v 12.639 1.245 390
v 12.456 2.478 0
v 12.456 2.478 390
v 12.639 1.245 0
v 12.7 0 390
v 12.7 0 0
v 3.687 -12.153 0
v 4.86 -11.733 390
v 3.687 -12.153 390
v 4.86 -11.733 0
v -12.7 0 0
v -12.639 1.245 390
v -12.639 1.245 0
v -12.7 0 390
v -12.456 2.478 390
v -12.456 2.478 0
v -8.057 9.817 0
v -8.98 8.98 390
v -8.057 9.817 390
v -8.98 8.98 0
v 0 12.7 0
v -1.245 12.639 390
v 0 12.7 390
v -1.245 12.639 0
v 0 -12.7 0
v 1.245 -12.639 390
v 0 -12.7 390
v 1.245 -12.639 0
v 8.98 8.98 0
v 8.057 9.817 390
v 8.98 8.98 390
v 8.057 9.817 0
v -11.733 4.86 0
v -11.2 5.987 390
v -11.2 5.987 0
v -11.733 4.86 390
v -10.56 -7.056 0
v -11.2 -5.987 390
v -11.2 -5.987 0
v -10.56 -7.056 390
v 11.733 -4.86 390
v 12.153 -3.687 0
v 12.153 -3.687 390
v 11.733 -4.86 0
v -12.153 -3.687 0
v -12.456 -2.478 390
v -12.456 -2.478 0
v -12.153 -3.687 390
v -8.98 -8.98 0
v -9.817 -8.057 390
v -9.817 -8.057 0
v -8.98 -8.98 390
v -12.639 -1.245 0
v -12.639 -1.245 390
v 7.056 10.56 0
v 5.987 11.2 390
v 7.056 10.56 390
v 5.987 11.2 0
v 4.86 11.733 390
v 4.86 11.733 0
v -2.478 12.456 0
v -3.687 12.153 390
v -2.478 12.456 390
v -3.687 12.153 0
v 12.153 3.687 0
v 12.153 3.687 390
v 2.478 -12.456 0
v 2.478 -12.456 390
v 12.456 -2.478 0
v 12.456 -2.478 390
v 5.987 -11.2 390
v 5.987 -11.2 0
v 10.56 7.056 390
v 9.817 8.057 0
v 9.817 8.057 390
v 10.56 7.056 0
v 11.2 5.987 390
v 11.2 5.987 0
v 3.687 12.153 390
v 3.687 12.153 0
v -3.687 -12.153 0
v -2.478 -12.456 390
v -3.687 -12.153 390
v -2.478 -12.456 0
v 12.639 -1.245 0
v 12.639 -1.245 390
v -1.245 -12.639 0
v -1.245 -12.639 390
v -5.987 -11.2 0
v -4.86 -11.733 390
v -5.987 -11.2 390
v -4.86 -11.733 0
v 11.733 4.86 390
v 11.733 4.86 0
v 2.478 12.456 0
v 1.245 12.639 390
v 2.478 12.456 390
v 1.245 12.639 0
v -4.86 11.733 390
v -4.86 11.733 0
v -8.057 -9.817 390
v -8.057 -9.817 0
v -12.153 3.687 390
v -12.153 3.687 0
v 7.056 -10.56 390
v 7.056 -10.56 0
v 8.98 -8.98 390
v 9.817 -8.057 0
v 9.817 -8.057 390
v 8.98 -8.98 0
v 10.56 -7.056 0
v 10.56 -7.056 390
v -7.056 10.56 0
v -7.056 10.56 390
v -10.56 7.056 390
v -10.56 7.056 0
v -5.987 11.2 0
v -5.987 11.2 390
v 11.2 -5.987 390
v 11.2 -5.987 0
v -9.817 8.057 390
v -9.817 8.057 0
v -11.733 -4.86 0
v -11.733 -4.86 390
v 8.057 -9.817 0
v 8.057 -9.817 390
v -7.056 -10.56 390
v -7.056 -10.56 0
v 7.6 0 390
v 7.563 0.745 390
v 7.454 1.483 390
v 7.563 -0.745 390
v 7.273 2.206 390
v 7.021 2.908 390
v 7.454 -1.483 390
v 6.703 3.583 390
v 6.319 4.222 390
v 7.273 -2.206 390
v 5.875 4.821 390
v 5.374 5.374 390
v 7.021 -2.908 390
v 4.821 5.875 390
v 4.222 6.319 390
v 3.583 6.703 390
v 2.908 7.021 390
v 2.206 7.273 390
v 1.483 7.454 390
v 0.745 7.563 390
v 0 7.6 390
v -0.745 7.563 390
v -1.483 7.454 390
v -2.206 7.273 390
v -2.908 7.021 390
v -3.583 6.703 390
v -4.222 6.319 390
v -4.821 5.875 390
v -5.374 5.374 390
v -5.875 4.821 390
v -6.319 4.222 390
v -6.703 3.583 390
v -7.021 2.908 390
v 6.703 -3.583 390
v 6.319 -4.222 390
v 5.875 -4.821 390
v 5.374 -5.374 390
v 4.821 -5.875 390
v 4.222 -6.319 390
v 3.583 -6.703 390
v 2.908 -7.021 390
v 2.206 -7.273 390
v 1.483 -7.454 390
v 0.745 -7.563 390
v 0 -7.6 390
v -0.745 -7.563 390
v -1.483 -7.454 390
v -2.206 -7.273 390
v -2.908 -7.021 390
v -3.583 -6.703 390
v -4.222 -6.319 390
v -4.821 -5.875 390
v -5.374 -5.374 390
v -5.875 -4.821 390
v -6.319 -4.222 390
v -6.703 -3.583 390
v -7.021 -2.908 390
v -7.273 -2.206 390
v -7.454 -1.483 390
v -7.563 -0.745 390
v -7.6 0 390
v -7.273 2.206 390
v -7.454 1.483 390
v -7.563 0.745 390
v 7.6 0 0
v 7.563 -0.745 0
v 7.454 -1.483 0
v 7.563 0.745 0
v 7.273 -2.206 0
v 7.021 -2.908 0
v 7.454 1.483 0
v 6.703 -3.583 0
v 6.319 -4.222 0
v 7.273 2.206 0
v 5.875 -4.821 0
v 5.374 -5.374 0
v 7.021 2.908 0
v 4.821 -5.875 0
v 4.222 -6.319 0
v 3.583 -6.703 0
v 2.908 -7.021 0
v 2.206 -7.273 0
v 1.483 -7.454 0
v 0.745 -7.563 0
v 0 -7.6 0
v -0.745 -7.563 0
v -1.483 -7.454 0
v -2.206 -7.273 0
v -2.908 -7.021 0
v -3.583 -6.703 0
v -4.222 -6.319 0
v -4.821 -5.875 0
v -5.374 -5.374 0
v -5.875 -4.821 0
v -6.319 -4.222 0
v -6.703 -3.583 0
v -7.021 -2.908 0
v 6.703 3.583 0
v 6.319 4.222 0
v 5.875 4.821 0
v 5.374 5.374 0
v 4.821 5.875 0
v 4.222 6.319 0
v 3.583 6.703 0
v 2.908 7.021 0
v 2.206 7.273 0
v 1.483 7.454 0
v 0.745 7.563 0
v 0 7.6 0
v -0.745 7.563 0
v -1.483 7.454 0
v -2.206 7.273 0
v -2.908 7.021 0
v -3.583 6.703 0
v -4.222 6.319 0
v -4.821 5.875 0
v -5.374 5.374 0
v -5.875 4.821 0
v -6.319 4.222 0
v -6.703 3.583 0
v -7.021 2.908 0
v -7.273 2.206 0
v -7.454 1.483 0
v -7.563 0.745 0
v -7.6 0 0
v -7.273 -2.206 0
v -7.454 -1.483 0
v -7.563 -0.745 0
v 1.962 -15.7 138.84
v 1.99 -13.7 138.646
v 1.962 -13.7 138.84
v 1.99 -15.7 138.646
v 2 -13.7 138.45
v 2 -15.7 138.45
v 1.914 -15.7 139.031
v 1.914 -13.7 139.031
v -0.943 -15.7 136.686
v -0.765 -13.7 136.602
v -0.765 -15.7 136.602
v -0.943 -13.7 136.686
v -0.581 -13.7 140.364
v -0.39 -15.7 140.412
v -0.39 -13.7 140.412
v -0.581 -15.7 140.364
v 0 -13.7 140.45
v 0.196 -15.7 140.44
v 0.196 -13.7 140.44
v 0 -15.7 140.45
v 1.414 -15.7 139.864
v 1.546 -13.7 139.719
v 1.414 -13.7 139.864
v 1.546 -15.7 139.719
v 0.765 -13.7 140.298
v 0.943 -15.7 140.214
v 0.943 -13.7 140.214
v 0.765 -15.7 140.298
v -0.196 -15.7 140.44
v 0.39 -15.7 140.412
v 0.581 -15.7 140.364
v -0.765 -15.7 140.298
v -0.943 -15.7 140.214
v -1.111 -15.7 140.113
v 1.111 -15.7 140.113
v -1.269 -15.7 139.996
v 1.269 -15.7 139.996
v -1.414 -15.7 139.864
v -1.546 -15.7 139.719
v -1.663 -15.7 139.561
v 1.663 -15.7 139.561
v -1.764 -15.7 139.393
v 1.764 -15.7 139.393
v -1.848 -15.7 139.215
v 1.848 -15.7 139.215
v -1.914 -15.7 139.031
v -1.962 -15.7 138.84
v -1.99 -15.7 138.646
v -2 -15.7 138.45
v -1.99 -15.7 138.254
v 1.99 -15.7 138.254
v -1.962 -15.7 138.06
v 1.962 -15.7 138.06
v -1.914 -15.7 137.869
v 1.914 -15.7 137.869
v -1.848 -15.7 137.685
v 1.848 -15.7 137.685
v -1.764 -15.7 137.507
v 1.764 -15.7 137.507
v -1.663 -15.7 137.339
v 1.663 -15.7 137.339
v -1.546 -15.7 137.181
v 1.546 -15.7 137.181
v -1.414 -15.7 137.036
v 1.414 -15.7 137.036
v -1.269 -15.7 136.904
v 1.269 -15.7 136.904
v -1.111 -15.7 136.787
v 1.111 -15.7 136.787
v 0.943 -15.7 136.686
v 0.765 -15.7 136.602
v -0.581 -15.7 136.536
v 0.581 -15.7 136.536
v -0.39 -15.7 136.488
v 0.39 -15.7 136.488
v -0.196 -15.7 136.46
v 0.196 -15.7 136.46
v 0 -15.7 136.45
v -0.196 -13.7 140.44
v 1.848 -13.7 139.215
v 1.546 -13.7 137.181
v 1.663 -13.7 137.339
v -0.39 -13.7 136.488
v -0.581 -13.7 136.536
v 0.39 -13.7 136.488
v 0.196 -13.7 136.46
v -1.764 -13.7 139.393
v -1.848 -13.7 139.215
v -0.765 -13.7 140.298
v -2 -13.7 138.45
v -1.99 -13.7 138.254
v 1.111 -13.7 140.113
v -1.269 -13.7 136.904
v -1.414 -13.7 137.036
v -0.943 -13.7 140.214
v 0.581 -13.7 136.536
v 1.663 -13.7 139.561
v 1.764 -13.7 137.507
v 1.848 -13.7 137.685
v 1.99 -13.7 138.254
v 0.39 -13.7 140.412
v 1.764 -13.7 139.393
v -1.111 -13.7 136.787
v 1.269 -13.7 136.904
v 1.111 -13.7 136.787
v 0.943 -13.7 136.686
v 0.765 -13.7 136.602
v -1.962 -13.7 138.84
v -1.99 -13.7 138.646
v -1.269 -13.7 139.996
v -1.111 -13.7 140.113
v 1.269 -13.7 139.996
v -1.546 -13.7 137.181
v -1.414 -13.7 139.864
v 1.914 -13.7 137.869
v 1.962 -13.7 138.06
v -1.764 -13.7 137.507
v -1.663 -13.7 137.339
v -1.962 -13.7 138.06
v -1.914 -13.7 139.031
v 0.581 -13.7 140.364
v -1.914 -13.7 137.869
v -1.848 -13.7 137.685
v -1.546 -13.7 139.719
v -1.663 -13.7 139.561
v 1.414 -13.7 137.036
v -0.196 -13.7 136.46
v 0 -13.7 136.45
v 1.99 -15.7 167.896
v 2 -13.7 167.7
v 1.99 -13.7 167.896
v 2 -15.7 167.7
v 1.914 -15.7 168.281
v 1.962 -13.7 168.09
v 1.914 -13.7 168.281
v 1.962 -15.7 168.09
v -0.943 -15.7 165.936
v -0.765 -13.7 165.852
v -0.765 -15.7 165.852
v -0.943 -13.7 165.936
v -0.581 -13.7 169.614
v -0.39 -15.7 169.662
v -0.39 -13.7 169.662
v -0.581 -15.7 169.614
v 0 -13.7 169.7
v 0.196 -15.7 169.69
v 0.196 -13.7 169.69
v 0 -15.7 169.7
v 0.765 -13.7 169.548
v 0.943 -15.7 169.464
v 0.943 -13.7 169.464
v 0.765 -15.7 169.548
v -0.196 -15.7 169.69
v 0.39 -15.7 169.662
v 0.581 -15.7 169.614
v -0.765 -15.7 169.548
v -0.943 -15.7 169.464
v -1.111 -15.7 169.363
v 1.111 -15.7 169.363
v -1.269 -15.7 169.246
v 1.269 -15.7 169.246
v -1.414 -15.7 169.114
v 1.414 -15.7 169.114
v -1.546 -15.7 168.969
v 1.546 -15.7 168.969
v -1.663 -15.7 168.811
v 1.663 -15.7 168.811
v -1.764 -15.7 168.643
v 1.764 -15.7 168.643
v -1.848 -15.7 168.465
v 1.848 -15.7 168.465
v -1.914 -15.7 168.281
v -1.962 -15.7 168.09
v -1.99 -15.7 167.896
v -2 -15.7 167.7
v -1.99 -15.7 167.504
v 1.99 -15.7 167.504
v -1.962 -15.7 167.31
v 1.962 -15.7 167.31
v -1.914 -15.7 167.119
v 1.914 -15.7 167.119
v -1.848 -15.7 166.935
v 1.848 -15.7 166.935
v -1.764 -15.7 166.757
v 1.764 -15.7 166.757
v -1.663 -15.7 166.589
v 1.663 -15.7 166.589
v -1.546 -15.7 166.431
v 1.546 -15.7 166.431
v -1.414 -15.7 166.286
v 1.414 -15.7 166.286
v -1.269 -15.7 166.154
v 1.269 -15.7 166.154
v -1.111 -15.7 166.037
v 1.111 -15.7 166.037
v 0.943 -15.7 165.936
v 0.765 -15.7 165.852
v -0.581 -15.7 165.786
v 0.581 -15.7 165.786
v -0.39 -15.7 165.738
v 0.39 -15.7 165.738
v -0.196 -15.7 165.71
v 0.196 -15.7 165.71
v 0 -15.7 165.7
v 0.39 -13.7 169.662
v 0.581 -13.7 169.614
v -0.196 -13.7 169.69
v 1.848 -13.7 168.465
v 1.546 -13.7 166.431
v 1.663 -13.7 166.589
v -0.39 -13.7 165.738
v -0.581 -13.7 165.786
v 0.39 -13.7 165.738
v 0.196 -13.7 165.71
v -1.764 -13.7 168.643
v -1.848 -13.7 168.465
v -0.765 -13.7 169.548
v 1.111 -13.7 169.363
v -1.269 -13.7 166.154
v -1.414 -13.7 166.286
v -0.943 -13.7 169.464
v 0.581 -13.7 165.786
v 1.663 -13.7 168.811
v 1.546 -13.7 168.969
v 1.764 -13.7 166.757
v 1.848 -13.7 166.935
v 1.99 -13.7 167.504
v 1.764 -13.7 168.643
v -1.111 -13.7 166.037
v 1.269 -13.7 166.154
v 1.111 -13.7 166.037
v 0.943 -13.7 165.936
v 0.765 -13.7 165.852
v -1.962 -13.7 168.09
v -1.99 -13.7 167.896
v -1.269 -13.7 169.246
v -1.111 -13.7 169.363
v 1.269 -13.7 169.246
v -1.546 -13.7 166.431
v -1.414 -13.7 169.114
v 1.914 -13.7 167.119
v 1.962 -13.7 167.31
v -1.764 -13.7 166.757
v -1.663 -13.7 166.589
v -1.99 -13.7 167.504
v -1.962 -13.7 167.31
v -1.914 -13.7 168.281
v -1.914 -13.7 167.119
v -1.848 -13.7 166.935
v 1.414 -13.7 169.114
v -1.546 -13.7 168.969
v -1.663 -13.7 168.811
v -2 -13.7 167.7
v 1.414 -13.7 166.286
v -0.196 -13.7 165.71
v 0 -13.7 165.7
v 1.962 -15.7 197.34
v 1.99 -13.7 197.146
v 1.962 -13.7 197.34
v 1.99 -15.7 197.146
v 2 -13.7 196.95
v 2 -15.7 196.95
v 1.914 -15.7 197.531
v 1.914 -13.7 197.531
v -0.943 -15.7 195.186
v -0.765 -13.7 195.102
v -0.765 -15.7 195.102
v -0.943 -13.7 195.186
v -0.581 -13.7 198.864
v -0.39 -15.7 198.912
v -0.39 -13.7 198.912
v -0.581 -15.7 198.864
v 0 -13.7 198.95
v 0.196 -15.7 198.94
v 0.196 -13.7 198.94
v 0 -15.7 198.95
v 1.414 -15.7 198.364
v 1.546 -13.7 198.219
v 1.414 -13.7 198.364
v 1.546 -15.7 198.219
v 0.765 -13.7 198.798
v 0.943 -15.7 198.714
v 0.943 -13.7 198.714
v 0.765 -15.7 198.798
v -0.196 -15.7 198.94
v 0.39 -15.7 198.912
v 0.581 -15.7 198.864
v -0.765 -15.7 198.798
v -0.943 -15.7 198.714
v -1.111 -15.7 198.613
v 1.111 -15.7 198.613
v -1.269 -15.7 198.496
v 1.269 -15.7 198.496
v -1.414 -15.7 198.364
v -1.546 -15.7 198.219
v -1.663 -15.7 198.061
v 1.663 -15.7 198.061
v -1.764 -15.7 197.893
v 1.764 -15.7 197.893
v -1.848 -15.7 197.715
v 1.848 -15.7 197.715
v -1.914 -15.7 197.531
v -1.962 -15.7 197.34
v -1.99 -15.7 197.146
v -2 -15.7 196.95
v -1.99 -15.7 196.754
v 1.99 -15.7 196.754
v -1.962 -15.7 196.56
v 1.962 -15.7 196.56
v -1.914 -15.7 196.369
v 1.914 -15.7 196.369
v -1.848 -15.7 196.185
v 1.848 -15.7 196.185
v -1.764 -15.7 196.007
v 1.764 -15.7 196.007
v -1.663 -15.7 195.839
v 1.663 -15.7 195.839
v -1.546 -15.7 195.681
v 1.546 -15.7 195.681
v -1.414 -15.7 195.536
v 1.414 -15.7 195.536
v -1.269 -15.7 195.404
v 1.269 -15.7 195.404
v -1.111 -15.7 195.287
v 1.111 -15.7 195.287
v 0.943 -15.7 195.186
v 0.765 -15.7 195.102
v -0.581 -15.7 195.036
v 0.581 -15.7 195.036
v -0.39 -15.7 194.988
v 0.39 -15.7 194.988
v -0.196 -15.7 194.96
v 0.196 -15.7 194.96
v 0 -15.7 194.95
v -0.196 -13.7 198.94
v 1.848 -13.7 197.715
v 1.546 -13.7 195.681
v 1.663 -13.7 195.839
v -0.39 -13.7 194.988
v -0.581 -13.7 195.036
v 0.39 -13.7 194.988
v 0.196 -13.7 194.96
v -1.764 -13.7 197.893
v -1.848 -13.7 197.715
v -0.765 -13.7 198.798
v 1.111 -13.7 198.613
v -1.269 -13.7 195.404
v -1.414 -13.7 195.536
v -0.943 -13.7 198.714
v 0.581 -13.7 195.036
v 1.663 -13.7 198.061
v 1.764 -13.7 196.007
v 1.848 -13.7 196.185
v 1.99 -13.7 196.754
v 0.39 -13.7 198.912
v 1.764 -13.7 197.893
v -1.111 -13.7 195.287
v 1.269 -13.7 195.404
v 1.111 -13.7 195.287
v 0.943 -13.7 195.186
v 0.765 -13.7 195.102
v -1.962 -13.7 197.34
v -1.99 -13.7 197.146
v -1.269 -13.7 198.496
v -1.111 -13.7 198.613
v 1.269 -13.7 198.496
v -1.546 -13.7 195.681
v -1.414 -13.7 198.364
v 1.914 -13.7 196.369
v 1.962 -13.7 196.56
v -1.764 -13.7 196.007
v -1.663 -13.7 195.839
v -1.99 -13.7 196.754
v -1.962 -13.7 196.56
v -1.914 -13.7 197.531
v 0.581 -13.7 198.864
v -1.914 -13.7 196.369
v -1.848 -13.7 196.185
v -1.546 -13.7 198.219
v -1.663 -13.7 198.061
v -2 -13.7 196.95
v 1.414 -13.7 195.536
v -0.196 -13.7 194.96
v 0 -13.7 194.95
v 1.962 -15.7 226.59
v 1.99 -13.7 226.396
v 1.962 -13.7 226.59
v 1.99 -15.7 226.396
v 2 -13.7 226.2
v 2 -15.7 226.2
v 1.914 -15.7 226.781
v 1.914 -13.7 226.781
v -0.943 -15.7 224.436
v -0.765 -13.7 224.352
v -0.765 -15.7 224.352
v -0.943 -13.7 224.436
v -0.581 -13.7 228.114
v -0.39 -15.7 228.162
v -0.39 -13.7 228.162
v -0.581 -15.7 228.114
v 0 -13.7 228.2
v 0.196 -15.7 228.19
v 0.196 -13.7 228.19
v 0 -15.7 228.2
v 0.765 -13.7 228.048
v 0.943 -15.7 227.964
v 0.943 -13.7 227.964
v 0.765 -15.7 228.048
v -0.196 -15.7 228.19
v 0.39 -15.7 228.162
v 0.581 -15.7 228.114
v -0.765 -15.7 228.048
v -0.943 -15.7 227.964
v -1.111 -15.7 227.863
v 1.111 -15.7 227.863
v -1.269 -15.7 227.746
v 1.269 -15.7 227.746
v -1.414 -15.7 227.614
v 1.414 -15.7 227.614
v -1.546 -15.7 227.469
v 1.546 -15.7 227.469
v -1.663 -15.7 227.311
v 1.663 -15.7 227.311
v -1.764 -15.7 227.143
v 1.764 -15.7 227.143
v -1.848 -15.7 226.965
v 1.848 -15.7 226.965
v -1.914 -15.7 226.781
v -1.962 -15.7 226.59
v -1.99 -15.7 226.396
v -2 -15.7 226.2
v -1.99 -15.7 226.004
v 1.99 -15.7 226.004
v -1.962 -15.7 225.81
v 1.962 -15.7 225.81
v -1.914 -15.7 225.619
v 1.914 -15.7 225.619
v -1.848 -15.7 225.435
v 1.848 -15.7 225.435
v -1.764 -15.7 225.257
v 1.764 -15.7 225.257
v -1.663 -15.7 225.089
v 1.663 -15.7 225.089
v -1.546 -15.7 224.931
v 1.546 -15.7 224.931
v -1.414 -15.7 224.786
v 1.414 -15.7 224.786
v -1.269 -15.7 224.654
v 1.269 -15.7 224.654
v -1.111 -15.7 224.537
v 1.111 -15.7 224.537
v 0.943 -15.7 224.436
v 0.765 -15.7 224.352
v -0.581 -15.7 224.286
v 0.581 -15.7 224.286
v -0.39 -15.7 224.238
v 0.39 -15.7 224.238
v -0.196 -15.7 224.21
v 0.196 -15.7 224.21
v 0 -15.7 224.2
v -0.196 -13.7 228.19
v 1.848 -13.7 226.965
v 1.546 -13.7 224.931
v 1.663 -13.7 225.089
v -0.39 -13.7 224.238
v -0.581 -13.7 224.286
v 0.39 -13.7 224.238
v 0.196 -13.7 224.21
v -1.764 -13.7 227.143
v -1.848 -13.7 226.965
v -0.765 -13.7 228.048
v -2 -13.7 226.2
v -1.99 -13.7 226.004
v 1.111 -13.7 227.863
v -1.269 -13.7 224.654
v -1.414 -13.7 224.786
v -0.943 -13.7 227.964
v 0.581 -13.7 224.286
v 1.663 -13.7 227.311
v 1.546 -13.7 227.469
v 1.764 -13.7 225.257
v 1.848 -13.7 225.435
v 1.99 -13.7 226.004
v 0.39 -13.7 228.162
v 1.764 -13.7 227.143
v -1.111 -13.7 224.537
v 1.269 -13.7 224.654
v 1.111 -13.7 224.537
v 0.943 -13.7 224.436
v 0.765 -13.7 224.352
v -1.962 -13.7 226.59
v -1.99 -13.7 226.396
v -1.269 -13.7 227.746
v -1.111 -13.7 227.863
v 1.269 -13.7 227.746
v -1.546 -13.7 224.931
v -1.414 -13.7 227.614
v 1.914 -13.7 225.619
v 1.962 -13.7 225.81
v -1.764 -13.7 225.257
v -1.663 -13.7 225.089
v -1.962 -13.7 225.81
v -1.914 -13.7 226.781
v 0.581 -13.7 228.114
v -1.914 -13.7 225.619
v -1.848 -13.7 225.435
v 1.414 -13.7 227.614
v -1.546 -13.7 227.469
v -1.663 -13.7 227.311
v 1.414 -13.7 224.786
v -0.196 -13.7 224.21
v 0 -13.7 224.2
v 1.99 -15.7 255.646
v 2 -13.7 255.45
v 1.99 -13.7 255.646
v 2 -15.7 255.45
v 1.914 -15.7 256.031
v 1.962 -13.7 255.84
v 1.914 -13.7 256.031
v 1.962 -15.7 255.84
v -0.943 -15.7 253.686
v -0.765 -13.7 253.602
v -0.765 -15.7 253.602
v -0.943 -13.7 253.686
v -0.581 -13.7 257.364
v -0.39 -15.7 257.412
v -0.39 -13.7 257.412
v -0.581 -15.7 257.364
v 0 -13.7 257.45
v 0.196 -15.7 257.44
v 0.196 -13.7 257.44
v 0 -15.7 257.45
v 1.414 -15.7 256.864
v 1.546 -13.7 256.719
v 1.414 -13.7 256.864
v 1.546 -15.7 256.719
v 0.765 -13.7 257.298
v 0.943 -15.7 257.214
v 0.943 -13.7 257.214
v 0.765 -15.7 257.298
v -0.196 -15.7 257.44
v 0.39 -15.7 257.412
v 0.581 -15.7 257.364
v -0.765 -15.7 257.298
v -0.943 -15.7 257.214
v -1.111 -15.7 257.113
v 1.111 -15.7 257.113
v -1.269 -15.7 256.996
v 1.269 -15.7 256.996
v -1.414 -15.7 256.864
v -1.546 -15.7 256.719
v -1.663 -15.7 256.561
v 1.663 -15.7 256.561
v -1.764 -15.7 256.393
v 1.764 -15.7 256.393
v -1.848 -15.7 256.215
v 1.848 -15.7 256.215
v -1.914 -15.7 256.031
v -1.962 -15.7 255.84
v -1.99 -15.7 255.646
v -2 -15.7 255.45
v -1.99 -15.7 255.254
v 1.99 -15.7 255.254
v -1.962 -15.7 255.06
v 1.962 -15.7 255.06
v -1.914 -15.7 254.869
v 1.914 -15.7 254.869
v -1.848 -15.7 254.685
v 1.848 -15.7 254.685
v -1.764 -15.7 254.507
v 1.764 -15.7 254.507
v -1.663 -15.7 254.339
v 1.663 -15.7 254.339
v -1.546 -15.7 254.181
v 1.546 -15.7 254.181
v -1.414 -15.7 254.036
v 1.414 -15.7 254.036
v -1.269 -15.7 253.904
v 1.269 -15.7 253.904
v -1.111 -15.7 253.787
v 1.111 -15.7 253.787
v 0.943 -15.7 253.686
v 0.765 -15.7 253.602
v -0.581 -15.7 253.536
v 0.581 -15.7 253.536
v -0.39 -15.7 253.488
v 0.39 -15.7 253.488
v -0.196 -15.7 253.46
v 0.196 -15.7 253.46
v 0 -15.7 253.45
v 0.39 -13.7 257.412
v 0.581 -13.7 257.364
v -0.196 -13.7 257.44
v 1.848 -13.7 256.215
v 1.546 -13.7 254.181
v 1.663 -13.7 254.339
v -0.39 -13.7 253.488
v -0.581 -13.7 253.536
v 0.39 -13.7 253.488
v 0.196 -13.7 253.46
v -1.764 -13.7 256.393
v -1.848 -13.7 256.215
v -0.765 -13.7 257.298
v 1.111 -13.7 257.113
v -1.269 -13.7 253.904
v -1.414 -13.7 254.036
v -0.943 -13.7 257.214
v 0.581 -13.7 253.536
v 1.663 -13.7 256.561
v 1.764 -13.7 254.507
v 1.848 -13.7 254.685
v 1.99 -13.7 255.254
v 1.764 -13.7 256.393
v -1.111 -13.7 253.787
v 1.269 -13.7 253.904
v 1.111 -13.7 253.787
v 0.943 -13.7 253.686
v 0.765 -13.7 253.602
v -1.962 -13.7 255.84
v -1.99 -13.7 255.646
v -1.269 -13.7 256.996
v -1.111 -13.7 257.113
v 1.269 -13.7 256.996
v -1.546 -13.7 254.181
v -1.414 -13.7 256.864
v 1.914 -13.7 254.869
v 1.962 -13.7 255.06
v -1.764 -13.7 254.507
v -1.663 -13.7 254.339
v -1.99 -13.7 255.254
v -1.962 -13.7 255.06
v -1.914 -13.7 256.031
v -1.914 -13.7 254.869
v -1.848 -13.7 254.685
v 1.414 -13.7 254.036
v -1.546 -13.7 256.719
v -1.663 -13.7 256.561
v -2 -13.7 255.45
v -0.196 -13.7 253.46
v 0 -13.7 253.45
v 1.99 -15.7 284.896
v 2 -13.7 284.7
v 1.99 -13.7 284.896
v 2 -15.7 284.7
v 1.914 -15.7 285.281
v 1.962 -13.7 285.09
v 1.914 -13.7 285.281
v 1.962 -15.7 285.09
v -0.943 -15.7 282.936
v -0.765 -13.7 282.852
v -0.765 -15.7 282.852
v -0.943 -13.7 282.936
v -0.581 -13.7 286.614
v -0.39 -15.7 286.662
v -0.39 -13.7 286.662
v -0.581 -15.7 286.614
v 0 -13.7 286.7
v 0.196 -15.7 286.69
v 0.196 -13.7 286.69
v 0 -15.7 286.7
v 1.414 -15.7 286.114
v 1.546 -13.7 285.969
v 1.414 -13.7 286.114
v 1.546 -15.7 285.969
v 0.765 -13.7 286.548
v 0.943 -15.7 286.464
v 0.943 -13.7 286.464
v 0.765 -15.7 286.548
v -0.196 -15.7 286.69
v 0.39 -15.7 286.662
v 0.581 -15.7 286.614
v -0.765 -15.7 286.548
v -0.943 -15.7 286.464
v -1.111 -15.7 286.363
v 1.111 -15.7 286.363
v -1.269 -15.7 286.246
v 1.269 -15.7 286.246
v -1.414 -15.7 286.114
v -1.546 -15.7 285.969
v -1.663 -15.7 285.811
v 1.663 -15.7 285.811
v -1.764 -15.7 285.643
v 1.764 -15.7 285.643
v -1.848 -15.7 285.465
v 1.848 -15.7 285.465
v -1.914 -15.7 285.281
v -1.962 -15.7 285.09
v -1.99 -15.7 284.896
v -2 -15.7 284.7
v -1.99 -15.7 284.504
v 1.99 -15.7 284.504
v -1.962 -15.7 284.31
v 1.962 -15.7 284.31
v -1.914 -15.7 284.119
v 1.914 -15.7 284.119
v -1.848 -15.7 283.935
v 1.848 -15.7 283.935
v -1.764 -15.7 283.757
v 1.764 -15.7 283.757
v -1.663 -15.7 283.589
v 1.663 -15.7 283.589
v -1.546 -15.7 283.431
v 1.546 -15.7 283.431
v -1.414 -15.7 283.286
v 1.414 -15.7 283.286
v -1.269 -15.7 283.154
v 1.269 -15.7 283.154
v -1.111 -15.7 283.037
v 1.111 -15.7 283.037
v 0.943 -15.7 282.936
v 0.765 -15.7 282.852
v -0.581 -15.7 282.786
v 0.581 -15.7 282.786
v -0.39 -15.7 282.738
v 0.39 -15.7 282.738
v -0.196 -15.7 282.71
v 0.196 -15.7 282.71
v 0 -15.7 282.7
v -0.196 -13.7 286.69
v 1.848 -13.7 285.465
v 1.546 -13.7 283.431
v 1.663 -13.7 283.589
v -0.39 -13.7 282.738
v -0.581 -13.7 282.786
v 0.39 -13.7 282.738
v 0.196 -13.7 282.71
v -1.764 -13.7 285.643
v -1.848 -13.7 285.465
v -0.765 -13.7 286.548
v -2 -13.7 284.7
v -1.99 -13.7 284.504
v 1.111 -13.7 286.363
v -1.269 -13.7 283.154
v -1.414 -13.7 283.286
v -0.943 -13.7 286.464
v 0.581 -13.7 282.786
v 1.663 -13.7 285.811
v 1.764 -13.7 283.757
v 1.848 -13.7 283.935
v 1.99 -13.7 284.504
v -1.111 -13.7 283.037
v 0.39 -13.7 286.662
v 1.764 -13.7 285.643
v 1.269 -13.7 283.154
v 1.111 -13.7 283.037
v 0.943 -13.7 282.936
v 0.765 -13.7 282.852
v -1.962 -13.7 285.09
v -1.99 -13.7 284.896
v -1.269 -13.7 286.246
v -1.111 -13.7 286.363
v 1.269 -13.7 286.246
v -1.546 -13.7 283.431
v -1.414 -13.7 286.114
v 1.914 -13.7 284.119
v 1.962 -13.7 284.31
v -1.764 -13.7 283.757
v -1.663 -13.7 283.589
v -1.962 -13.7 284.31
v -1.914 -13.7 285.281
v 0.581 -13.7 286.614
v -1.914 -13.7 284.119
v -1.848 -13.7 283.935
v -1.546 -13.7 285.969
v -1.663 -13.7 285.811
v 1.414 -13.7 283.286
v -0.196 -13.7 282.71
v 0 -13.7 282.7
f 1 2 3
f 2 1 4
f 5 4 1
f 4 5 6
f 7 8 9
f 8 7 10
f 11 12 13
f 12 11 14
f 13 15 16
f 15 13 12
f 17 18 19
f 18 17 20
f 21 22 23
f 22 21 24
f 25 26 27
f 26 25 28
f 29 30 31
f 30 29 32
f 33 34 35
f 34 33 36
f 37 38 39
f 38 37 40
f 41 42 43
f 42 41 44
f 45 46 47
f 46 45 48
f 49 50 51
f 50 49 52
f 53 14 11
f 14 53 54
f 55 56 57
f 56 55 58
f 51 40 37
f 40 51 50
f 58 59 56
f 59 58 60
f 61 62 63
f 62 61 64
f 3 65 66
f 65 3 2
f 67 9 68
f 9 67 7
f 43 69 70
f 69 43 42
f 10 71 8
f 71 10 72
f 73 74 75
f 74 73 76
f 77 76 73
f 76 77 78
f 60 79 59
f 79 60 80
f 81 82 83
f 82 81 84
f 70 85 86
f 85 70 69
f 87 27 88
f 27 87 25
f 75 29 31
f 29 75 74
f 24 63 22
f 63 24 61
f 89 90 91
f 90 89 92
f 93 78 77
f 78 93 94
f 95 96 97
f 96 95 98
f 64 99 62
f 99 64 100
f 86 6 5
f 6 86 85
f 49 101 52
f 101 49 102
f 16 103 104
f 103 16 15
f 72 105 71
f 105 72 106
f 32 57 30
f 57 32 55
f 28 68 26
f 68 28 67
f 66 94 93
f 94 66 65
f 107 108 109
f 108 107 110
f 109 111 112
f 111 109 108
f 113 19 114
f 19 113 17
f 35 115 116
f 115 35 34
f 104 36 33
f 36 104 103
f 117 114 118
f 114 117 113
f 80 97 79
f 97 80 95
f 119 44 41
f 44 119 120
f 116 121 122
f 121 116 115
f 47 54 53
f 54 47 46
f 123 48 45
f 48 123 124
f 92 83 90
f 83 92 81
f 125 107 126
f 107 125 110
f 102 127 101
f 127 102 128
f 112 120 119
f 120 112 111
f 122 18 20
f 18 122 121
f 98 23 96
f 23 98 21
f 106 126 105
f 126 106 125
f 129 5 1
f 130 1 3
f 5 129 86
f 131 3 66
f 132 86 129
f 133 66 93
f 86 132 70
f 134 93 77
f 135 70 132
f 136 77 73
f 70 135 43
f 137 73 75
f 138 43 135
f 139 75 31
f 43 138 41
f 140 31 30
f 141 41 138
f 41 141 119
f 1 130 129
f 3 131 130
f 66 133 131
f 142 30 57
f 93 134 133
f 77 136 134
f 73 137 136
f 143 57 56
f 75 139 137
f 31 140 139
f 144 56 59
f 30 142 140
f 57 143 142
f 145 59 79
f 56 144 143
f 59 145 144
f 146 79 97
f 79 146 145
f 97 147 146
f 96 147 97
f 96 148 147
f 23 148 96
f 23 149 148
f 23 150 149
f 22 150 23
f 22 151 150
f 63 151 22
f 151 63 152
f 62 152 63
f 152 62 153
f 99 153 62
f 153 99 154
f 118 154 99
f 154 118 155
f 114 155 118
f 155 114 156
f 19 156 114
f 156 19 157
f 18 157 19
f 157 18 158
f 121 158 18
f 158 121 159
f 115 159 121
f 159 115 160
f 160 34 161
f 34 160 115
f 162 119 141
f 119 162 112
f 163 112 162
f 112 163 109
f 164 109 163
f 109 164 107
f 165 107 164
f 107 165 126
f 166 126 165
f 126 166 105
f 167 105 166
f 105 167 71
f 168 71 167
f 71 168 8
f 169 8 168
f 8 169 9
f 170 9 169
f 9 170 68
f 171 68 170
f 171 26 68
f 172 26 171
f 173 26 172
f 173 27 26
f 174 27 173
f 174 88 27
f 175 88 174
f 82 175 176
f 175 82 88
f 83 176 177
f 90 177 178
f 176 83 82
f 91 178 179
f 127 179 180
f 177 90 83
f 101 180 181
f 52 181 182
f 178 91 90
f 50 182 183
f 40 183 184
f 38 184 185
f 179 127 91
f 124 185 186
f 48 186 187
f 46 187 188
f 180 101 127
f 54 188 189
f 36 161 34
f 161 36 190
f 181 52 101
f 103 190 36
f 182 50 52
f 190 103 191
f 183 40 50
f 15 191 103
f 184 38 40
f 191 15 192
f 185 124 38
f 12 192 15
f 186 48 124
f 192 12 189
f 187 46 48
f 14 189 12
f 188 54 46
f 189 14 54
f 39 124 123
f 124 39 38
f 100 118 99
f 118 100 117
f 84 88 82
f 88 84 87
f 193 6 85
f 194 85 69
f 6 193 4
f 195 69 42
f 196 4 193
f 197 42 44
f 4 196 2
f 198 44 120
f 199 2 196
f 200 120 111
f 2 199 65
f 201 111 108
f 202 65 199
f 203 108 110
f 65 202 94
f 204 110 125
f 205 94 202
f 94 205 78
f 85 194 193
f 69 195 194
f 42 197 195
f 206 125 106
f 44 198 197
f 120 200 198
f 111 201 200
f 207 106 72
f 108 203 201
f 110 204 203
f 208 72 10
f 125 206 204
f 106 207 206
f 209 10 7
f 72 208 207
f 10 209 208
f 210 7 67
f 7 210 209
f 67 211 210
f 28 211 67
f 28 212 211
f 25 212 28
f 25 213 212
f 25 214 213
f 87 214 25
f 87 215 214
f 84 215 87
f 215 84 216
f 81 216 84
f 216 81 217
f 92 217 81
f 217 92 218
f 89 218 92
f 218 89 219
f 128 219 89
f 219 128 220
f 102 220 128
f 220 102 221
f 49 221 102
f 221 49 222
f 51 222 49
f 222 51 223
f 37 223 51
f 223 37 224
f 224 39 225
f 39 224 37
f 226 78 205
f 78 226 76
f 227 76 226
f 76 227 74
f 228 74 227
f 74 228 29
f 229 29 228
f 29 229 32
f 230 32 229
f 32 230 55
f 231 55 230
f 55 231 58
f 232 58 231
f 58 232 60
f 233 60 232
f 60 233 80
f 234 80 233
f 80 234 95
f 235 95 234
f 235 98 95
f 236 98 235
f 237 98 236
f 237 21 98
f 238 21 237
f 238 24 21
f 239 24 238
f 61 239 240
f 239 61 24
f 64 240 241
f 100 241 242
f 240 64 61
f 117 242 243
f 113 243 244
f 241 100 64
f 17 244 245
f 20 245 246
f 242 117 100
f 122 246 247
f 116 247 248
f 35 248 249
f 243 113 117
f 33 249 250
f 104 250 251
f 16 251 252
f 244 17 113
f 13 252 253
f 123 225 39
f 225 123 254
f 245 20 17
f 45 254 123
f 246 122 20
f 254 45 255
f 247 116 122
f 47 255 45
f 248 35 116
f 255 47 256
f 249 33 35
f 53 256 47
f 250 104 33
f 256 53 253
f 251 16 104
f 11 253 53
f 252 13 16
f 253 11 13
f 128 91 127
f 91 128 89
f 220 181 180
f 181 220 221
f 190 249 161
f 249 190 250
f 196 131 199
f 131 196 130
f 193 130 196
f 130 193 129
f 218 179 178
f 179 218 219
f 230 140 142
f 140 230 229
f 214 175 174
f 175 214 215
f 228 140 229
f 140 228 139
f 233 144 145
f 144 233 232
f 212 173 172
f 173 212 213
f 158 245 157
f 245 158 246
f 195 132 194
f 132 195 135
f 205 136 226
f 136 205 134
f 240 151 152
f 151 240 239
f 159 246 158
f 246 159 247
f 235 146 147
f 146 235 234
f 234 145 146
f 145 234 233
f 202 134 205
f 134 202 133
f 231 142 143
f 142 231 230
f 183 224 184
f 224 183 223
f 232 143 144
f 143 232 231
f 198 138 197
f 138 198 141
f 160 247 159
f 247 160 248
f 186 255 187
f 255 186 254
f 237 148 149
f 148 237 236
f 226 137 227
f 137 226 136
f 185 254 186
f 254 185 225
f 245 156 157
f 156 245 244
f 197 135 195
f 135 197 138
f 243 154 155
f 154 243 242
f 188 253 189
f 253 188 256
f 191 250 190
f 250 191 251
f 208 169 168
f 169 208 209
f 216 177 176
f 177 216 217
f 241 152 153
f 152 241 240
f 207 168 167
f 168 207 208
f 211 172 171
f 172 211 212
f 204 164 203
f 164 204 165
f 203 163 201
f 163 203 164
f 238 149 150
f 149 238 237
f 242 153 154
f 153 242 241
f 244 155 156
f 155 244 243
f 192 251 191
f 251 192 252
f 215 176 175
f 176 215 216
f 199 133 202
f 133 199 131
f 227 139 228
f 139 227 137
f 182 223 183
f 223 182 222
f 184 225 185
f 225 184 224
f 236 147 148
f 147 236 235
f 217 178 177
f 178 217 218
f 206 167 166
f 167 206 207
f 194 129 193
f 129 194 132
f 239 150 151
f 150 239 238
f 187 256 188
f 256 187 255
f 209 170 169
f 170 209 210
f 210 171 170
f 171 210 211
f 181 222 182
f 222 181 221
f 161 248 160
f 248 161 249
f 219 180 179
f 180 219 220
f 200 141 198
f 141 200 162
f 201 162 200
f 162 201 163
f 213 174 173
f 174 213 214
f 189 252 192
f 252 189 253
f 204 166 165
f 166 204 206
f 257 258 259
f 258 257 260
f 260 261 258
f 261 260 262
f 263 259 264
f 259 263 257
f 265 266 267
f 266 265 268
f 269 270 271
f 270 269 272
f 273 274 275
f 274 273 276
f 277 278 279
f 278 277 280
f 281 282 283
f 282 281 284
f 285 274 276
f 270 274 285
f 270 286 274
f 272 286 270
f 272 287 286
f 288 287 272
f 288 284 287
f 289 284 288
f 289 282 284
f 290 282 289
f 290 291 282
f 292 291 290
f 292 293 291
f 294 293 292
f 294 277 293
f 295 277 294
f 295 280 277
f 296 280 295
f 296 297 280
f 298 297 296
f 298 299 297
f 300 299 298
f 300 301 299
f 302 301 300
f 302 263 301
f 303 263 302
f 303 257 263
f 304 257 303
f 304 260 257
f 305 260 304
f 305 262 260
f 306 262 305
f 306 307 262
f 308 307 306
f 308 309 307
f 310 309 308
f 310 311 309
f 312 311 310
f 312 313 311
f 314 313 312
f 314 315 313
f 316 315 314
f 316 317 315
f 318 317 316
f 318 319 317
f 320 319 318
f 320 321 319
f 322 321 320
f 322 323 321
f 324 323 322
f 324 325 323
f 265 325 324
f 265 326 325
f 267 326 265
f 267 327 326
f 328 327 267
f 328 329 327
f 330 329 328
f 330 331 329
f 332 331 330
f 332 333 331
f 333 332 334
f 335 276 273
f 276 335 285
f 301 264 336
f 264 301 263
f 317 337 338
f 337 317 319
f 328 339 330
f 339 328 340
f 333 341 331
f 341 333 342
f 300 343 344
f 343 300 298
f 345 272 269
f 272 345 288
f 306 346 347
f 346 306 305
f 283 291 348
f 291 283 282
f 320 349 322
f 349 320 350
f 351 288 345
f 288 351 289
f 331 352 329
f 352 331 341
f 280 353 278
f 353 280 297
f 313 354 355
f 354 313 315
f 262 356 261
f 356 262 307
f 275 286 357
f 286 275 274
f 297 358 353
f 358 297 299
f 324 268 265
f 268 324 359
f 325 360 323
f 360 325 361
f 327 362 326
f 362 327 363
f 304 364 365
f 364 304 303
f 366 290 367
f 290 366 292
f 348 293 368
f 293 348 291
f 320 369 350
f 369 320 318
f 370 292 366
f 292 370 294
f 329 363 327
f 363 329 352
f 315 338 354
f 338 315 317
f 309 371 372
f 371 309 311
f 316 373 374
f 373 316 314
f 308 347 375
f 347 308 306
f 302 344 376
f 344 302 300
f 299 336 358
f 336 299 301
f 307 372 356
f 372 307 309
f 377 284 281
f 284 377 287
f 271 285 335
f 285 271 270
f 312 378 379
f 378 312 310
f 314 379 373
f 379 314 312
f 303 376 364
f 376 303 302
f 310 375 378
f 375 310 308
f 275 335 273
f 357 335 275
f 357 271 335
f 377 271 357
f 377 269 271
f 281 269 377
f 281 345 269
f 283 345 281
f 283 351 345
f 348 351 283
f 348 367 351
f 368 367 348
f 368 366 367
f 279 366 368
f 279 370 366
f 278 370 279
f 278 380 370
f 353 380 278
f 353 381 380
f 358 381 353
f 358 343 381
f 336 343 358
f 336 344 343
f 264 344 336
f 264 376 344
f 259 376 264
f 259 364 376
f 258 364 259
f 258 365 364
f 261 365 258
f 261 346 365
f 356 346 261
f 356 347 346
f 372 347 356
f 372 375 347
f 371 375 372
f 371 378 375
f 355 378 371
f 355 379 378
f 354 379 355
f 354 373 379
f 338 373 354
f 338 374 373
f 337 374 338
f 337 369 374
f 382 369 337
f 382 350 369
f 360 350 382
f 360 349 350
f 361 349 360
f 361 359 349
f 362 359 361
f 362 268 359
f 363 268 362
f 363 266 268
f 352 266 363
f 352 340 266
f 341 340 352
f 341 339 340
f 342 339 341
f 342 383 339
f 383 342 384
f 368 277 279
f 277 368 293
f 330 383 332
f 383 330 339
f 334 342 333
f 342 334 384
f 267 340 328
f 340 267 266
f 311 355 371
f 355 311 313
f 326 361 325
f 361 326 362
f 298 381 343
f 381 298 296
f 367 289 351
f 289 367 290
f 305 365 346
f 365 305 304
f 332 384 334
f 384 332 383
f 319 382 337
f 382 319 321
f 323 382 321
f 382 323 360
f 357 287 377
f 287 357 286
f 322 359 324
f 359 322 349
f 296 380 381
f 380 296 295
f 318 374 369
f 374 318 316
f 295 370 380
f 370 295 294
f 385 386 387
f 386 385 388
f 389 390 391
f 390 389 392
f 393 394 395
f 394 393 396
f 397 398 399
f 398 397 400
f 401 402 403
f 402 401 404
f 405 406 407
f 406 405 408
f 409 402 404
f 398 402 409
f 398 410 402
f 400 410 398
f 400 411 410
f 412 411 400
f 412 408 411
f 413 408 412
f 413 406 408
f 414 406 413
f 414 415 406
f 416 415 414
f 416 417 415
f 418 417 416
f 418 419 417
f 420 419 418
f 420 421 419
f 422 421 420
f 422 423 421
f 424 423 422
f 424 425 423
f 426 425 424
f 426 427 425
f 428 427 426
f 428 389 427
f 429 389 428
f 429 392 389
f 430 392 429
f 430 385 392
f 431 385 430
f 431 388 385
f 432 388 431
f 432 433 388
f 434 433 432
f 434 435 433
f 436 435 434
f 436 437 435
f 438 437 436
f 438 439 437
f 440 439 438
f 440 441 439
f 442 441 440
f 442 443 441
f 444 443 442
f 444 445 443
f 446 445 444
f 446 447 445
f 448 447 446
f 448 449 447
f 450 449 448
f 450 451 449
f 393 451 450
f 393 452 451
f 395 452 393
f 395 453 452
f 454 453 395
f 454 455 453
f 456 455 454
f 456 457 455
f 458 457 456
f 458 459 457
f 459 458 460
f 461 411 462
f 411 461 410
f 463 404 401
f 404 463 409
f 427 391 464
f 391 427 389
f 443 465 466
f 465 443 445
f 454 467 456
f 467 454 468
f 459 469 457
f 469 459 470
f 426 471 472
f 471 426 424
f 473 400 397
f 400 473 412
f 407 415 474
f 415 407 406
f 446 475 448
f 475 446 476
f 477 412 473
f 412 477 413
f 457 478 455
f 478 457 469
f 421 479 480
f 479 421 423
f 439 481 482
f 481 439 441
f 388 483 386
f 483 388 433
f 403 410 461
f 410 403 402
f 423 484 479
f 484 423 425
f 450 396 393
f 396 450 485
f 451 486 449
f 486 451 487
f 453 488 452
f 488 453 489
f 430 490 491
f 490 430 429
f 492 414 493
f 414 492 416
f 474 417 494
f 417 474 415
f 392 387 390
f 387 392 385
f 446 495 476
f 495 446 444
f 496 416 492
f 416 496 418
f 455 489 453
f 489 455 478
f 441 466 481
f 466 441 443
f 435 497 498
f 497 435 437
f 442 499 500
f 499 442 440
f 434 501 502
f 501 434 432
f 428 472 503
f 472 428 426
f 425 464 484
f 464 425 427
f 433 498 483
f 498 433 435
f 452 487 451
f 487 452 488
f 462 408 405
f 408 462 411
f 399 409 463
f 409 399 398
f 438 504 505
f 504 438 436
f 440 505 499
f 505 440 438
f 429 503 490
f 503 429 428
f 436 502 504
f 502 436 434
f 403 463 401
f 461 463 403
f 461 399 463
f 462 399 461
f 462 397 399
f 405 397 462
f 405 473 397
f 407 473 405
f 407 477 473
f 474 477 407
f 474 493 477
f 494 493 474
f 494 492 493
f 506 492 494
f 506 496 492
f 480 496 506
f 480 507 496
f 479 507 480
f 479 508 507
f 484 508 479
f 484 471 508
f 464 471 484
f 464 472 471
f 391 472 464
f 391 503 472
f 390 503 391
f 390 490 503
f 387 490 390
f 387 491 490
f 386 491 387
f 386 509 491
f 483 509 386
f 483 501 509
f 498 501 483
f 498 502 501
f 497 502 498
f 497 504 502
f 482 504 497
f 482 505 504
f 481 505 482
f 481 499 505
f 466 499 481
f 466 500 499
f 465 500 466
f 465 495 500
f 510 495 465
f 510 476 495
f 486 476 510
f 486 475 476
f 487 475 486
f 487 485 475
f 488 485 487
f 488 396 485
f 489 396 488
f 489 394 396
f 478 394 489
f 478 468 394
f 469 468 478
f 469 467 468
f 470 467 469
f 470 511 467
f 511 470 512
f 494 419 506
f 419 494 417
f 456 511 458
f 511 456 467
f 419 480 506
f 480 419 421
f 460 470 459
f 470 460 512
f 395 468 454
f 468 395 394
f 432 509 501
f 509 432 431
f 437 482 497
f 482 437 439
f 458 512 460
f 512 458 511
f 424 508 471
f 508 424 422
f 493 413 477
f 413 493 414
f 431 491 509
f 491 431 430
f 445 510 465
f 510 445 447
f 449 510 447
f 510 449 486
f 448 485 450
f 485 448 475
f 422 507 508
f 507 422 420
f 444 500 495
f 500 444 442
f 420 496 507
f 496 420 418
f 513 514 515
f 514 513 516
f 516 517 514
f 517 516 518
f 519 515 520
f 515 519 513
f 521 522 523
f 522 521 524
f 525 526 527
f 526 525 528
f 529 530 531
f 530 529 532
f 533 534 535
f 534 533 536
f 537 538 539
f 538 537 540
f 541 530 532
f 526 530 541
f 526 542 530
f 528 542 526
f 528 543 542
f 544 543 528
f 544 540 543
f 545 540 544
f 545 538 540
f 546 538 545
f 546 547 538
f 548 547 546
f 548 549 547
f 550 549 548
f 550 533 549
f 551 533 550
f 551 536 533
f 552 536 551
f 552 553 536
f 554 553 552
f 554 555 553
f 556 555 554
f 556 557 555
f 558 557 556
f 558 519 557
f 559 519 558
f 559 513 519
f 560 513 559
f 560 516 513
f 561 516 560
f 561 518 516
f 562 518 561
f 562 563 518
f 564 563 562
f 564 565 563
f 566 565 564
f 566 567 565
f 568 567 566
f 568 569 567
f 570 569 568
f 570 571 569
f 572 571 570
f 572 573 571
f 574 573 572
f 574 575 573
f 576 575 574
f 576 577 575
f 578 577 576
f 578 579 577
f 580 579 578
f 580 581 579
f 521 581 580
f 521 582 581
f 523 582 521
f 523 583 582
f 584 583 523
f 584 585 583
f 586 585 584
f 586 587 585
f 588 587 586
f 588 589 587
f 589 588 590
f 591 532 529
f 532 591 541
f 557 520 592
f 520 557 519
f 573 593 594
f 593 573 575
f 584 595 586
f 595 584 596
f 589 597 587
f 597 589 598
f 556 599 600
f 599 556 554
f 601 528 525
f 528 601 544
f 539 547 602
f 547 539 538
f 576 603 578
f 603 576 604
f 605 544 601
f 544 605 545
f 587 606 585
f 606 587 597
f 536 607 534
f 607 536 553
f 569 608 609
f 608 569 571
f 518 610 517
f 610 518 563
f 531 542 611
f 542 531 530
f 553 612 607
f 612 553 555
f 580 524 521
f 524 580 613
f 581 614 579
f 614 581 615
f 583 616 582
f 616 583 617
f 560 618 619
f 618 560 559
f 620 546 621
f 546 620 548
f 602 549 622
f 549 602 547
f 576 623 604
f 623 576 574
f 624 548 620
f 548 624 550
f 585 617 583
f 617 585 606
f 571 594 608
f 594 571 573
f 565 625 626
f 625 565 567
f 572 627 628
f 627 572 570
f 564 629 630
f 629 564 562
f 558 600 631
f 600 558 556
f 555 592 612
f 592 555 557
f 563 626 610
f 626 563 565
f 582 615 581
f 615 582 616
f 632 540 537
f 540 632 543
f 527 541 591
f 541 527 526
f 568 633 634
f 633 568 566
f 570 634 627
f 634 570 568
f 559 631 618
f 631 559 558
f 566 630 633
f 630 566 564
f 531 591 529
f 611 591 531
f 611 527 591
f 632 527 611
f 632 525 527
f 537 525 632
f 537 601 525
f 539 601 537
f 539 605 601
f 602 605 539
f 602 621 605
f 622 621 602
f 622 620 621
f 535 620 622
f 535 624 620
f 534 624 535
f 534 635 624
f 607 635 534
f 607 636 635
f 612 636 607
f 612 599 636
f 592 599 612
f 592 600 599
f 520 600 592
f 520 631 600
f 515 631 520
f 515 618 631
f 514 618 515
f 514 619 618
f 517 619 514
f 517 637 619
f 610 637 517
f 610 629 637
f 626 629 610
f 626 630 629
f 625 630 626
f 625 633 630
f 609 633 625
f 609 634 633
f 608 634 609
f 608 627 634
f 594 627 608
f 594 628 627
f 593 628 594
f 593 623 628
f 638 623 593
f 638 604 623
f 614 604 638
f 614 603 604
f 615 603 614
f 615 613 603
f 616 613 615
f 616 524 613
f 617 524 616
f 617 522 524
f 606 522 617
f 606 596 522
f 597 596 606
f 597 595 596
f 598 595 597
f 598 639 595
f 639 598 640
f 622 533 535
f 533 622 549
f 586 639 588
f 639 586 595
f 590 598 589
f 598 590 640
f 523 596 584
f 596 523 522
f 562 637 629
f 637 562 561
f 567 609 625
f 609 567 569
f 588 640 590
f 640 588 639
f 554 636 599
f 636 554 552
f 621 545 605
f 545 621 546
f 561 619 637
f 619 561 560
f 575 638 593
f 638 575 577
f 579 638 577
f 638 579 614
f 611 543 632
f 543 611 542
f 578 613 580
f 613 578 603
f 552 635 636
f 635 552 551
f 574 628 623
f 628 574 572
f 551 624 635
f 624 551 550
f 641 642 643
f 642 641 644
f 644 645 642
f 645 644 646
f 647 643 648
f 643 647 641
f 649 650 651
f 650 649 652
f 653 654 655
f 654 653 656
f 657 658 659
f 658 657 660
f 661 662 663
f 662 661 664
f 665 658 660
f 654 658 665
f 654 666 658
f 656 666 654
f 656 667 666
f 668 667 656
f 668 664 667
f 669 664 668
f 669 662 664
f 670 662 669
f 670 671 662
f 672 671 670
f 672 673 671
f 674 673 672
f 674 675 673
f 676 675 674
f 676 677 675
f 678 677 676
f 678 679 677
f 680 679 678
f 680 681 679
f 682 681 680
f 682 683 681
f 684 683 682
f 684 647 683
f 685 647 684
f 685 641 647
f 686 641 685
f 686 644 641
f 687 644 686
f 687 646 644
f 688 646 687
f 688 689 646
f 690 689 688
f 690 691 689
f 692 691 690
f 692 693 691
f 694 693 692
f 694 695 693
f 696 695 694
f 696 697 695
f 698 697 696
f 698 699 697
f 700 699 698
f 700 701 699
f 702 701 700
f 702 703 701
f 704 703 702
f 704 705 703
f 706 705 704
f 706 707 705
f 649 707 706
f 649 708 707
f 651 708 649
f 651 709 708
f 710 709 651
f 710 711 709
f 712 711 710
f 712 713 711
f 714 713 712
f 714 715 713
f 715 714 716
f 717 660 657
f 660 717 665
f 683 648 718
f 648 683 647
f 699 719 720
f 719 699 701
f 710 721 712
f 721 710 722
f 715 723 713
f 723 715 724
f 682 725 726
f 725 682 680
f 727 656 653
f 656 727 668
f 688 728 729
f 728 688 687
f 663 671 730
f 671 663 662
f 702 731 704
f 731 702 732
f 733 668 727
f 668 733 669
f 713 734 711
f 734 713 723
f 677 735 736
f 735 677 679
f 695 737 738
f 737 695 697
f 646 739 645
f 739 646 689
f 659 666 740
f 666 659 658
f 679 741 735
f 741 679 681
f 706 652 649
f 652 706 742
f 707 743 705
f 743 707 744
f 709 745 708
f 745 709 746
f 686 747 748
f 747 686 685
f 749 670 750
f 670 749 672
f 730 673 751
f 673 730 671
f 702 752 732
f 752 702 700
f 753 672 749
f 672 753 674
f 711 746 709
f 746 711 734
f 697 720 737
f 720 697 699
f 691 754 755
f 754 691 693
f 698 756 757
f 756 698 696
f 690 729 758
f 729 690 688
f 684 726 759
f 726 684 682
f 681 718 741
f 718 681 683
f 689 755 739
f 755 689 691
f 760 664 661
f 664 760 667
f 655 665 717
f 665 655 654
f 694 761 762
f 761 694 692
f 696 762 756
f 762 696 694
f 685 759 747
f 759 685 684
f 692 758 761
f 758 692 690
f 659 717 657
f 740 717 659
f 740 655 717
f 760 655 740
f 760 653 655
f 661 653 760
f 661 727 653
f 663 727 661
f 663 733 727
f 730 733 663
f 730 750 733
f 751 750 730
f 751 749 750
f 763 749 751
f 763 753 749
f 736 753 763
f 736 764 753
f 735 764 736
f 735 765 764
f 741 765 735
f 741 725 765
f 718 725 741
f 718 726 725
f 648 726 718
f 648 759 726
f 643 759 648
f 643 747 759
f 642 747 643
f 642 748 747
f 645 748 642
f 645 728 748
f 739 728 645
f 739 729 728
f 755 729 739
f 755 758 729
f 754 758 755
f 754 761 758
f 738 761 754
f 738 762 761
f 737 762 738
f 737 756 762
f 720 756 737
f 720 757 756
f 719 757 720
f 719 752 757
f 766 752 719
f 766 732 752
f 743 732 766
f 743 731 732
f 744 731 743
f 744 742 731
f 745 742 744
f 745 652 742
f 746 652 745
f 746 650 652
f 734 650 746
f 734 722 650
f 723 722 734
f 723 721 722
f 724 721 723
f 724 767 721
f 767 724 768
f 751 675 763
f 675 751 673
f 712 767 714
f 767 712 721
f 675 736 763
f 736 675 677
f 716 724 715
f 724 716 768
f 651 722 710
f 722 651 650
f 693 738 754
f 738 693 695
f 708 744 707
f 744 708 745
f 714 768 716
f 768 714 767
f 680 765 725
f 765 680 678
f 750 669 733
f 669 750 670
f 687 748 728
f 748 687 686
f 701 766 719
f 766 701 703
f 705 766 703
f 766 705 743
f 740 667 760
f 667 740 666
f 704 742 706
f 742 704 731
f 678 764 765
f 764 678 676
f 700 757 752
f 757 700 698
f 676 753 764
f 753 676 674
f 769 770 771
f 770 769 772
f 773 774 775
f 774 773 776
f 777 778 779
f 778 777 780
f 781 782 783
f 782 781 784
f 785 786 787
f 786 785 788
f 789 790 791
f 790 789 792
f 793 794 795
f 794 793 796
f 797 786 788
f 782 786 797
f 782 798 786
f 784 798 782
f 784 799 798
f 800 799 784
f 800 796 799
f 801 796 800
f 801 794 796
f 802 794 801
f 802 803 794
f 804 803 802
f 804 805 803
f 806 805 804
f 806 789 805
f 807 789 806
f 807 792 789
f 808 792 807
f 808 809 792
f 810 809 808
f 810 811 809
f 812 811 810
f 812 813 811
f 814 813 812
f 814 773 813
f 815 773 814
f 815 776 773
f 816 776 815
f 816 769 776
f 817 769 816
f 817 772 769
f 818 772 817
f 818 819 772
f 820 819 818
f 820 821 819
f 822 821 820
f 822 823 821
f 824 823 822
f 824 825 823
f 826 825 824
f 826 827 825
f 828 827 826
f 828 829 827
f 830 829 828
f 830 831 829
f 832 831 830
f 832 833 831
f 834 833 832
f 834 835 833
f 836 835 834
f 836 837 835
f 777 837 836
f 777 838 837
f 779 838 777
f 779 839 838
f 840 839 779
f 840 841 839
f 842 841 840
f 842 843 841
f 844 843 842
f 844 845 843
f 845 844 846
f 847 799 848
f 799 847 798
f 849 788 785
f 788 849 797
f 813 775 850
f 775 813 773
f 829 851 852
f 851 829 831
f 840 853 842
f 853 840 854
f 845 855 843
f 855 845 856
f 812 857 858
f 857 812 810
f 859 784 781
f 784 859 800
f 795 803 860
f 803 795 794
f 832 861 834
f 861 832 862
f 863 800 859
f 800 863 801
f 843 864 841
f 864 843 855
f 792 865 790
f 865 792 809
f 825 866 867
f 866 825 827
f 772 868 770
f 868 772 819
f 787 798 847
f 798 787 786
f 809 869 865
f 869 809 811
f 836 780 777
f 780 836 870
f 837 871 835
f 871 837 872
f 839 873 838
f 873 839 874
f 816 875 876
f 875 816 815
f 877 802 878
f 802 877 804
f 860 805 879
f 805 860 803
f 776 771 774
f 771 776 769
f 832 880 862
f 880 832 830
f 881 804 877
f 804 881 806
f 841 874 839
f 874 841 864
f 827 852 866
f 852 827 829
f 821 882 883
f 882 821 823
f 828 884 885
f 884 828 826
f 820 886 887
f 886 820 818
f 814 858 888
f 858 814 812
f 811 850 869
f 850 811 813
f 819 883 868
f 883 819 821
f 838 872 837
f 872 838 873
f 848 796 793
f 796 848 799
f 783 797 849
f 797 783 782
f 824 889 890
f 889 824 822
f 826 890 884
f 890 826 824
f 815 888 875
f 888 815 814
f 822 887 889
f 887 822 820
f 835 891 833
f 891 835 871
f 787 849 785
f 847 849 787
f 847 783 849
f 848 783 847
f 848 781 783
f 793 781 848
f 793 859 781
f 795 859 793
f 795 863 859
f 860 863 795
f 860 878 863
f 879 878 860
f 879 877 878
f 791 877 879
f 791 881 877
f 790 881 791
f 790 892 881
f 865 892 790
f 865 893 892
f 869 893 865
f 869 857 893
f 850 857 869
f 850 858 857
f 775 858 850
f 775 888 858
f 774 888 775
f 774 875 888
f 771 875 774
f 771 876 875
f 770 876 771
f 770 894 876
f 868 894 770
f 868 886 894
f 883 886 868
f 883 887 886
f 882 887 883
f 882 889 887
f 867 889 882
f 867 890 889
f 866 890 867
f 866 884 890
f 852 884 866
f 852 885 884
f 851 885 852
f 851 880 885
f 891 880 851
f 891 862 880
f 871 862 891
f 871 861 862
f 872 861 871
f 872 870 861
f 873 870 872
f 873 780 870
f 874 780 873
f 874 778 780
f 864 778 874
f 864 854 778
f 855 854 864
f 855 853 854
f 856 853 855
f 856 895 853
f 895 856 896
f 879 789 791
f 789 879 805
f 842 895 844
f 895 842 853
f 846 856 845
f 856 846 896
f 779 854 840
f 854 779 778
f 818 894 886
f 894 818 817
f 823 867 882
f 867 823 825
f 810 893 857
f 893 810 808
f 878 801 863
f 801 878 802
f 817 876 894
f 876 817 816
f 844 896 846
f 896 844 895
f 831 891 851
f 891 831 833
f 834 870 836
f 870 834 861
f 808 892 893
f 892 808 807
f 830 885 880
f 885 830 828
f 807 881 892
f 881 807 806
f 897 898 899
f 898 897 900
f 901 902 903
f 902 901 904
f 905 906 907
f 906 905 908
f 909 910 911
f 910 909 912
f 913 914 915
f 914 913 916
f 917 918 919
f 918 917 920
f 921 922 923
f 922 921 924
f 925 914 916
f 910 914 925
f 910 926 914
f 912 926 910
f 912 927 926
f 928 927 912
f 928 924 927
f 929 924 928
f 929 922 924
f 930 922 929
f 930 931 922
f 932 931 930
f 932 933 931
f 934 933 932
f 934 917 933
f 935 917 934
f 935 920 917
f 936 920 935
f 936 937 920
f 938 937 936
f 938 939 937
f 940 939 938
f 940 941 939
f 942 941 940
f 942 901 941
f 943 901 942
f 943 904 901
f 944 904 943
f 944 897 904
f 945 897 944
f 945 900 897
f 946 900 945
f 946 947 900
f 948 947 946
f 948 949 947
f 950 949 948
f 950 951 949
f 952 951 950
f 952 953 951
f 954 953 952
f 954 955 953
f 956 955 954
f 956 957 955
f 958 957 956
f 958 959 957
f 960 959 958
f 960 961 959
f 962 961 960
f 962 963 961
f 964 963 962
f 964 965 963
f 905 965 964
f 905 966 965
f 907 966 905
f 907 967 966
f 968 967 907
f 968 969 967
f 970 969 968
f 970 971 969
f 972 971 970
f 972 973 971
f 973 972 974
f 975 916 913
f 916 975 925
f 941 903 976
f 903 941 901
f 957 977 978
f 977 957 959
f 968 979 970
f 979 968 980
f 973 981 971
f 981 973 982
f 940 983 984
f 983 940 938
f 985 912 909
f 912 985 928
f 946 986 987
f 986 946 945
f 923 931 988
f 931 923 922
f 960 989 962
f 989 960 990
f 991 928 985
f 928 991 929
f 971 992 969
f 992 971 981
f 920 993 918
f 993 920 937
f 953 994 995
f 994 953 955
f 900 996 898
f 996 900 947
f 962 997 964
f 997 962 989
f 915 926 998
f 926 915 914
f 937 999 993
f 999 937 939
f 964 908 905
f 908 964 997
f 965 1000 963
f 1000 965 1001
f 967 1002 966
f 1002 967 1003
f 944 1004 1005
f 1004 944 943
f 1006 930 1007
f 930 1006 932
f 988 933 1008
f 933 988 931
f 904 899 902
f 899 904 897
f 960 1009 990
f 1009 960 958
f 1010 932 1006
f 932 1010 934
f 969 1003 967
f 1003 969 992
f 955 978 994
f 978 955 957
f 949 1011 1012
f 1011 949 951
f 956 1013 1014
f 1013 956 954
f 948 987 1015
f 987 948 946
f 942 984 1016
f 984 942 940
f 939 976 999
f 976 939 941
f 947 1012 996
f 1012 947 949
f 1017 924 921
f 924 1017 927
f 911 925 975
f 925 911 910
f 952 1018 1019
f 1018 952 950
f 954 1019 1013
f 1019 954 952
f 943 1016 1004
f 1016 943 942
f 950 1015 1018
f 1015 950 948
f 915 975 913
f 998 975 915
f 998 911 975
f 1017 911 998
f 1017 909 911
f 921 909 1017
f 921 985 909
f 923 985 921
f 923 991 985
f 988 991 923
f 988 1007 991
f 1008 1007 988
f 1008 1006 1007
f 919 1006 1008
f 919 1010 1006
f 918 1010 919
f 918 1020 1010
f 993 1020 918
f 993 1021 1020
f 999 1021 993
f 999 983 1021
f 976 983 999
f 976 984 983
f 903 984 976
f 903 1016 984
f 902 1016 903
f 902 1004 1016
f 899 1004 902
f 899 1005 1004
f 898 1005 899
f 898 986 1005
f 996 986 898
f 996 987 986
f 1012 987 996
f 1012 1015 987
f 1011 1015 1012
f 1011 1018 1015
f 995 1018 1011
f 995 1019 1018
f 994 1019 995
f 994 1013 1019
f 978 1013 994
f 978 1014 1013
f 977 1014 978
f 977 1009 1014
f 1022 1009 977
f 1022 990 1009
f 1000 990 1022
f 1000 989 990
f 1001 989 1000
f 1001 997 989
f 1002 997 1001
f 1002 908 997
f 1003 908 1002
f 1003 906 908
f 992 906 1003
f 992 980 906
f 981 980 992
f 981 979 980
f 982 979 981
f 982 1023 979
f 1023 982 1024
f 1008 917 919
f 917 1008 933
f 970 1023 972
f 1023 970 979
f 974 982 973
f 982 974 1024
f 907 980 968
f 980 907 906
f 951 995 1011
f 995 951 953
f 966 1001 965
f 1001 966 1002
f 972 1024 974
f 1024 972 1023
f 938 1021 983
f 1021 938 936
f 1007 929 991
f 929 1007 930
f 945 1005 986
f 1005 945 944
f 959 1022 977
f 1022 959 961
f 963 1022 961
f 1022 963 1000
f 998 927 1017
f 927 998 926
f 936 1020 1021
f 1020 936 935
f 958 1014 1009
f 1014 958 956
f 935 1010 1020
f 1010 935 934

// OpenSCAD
// Flutes family scaffold for Round 31 issue #3.
// This is not a cut-ready flute model. Critical dimensions stay tied to
// cad/design-table-seed.csv and family-spec.csv until workbook rows and
// physical measurements are extracted.

$fn = 64;

show_family = "NAF-6H"; // NAF-6H, PVC-TRAIN, LEGACY-SW

naf_placeholder_length_mm = 390; // A4 analysis effective length reference only
naf_placeholder_bore_mm = 15.2;  // A4 FEM analysis row, not full packet authority
pvc_placeholder_length_mm = 390; // measurement_required
pvc_placeholder_bore_mm = 19.0;  // nominal placeholder, measure actual stock
body_wall_mm = 5.1;              // A4 FEM analysis row, measurement_required

module flute_body(length_mm, bore_mm, wall_mm) {
  difference() {
    cylinder(h = length_mm, d = bore_mm + 2 * wall_mm);
    translate([0, 0, -1])
      cylinder(h = length_mm + 2, d = bore_mm);
  }
}

module six_hole_markers(length_mm, bore_mm, wall_mm) {
  // Marker stations only. Real stations must come from workbook extraction.
  for (i = [1:6]) {
    translate([0, -(bore_mm / 2 + wall_mm + 1), length_mm * (0.28 + i * 0.075)])
      rotate([90, 0, 0])
        cylinder(h = 2, d = 4);
  }
}

module naf_scaffold() {
  color([0.55, 0.33, 0.18])
    flute_body(naf_placeholder_length_mm, naf_placeholder_bore_mm, body_wall_mm);
  color([0.1, 0.1, 0.1])
    six_hole_markers(naf_placeholder_length_mm, naf_placeholder_bore_mm, body_wall_mm);
}

module pvc_scaffold() {
  color([0.85, 0.85, 0.8])
    flute_body(pvc_placeholder_length_mm, pvc_placeholder_bore_mm, 2.5);
  color([0.1, 0.1, 0.1])
    six_hole_markers(pvc_placeholder_length_mm, pvc_placeholder_bore_mm, 2.5);
}

if (show_family == "PVC-TRAIN") {
  pvc_scaffold();
} else {
  naf_scaffold();
}
